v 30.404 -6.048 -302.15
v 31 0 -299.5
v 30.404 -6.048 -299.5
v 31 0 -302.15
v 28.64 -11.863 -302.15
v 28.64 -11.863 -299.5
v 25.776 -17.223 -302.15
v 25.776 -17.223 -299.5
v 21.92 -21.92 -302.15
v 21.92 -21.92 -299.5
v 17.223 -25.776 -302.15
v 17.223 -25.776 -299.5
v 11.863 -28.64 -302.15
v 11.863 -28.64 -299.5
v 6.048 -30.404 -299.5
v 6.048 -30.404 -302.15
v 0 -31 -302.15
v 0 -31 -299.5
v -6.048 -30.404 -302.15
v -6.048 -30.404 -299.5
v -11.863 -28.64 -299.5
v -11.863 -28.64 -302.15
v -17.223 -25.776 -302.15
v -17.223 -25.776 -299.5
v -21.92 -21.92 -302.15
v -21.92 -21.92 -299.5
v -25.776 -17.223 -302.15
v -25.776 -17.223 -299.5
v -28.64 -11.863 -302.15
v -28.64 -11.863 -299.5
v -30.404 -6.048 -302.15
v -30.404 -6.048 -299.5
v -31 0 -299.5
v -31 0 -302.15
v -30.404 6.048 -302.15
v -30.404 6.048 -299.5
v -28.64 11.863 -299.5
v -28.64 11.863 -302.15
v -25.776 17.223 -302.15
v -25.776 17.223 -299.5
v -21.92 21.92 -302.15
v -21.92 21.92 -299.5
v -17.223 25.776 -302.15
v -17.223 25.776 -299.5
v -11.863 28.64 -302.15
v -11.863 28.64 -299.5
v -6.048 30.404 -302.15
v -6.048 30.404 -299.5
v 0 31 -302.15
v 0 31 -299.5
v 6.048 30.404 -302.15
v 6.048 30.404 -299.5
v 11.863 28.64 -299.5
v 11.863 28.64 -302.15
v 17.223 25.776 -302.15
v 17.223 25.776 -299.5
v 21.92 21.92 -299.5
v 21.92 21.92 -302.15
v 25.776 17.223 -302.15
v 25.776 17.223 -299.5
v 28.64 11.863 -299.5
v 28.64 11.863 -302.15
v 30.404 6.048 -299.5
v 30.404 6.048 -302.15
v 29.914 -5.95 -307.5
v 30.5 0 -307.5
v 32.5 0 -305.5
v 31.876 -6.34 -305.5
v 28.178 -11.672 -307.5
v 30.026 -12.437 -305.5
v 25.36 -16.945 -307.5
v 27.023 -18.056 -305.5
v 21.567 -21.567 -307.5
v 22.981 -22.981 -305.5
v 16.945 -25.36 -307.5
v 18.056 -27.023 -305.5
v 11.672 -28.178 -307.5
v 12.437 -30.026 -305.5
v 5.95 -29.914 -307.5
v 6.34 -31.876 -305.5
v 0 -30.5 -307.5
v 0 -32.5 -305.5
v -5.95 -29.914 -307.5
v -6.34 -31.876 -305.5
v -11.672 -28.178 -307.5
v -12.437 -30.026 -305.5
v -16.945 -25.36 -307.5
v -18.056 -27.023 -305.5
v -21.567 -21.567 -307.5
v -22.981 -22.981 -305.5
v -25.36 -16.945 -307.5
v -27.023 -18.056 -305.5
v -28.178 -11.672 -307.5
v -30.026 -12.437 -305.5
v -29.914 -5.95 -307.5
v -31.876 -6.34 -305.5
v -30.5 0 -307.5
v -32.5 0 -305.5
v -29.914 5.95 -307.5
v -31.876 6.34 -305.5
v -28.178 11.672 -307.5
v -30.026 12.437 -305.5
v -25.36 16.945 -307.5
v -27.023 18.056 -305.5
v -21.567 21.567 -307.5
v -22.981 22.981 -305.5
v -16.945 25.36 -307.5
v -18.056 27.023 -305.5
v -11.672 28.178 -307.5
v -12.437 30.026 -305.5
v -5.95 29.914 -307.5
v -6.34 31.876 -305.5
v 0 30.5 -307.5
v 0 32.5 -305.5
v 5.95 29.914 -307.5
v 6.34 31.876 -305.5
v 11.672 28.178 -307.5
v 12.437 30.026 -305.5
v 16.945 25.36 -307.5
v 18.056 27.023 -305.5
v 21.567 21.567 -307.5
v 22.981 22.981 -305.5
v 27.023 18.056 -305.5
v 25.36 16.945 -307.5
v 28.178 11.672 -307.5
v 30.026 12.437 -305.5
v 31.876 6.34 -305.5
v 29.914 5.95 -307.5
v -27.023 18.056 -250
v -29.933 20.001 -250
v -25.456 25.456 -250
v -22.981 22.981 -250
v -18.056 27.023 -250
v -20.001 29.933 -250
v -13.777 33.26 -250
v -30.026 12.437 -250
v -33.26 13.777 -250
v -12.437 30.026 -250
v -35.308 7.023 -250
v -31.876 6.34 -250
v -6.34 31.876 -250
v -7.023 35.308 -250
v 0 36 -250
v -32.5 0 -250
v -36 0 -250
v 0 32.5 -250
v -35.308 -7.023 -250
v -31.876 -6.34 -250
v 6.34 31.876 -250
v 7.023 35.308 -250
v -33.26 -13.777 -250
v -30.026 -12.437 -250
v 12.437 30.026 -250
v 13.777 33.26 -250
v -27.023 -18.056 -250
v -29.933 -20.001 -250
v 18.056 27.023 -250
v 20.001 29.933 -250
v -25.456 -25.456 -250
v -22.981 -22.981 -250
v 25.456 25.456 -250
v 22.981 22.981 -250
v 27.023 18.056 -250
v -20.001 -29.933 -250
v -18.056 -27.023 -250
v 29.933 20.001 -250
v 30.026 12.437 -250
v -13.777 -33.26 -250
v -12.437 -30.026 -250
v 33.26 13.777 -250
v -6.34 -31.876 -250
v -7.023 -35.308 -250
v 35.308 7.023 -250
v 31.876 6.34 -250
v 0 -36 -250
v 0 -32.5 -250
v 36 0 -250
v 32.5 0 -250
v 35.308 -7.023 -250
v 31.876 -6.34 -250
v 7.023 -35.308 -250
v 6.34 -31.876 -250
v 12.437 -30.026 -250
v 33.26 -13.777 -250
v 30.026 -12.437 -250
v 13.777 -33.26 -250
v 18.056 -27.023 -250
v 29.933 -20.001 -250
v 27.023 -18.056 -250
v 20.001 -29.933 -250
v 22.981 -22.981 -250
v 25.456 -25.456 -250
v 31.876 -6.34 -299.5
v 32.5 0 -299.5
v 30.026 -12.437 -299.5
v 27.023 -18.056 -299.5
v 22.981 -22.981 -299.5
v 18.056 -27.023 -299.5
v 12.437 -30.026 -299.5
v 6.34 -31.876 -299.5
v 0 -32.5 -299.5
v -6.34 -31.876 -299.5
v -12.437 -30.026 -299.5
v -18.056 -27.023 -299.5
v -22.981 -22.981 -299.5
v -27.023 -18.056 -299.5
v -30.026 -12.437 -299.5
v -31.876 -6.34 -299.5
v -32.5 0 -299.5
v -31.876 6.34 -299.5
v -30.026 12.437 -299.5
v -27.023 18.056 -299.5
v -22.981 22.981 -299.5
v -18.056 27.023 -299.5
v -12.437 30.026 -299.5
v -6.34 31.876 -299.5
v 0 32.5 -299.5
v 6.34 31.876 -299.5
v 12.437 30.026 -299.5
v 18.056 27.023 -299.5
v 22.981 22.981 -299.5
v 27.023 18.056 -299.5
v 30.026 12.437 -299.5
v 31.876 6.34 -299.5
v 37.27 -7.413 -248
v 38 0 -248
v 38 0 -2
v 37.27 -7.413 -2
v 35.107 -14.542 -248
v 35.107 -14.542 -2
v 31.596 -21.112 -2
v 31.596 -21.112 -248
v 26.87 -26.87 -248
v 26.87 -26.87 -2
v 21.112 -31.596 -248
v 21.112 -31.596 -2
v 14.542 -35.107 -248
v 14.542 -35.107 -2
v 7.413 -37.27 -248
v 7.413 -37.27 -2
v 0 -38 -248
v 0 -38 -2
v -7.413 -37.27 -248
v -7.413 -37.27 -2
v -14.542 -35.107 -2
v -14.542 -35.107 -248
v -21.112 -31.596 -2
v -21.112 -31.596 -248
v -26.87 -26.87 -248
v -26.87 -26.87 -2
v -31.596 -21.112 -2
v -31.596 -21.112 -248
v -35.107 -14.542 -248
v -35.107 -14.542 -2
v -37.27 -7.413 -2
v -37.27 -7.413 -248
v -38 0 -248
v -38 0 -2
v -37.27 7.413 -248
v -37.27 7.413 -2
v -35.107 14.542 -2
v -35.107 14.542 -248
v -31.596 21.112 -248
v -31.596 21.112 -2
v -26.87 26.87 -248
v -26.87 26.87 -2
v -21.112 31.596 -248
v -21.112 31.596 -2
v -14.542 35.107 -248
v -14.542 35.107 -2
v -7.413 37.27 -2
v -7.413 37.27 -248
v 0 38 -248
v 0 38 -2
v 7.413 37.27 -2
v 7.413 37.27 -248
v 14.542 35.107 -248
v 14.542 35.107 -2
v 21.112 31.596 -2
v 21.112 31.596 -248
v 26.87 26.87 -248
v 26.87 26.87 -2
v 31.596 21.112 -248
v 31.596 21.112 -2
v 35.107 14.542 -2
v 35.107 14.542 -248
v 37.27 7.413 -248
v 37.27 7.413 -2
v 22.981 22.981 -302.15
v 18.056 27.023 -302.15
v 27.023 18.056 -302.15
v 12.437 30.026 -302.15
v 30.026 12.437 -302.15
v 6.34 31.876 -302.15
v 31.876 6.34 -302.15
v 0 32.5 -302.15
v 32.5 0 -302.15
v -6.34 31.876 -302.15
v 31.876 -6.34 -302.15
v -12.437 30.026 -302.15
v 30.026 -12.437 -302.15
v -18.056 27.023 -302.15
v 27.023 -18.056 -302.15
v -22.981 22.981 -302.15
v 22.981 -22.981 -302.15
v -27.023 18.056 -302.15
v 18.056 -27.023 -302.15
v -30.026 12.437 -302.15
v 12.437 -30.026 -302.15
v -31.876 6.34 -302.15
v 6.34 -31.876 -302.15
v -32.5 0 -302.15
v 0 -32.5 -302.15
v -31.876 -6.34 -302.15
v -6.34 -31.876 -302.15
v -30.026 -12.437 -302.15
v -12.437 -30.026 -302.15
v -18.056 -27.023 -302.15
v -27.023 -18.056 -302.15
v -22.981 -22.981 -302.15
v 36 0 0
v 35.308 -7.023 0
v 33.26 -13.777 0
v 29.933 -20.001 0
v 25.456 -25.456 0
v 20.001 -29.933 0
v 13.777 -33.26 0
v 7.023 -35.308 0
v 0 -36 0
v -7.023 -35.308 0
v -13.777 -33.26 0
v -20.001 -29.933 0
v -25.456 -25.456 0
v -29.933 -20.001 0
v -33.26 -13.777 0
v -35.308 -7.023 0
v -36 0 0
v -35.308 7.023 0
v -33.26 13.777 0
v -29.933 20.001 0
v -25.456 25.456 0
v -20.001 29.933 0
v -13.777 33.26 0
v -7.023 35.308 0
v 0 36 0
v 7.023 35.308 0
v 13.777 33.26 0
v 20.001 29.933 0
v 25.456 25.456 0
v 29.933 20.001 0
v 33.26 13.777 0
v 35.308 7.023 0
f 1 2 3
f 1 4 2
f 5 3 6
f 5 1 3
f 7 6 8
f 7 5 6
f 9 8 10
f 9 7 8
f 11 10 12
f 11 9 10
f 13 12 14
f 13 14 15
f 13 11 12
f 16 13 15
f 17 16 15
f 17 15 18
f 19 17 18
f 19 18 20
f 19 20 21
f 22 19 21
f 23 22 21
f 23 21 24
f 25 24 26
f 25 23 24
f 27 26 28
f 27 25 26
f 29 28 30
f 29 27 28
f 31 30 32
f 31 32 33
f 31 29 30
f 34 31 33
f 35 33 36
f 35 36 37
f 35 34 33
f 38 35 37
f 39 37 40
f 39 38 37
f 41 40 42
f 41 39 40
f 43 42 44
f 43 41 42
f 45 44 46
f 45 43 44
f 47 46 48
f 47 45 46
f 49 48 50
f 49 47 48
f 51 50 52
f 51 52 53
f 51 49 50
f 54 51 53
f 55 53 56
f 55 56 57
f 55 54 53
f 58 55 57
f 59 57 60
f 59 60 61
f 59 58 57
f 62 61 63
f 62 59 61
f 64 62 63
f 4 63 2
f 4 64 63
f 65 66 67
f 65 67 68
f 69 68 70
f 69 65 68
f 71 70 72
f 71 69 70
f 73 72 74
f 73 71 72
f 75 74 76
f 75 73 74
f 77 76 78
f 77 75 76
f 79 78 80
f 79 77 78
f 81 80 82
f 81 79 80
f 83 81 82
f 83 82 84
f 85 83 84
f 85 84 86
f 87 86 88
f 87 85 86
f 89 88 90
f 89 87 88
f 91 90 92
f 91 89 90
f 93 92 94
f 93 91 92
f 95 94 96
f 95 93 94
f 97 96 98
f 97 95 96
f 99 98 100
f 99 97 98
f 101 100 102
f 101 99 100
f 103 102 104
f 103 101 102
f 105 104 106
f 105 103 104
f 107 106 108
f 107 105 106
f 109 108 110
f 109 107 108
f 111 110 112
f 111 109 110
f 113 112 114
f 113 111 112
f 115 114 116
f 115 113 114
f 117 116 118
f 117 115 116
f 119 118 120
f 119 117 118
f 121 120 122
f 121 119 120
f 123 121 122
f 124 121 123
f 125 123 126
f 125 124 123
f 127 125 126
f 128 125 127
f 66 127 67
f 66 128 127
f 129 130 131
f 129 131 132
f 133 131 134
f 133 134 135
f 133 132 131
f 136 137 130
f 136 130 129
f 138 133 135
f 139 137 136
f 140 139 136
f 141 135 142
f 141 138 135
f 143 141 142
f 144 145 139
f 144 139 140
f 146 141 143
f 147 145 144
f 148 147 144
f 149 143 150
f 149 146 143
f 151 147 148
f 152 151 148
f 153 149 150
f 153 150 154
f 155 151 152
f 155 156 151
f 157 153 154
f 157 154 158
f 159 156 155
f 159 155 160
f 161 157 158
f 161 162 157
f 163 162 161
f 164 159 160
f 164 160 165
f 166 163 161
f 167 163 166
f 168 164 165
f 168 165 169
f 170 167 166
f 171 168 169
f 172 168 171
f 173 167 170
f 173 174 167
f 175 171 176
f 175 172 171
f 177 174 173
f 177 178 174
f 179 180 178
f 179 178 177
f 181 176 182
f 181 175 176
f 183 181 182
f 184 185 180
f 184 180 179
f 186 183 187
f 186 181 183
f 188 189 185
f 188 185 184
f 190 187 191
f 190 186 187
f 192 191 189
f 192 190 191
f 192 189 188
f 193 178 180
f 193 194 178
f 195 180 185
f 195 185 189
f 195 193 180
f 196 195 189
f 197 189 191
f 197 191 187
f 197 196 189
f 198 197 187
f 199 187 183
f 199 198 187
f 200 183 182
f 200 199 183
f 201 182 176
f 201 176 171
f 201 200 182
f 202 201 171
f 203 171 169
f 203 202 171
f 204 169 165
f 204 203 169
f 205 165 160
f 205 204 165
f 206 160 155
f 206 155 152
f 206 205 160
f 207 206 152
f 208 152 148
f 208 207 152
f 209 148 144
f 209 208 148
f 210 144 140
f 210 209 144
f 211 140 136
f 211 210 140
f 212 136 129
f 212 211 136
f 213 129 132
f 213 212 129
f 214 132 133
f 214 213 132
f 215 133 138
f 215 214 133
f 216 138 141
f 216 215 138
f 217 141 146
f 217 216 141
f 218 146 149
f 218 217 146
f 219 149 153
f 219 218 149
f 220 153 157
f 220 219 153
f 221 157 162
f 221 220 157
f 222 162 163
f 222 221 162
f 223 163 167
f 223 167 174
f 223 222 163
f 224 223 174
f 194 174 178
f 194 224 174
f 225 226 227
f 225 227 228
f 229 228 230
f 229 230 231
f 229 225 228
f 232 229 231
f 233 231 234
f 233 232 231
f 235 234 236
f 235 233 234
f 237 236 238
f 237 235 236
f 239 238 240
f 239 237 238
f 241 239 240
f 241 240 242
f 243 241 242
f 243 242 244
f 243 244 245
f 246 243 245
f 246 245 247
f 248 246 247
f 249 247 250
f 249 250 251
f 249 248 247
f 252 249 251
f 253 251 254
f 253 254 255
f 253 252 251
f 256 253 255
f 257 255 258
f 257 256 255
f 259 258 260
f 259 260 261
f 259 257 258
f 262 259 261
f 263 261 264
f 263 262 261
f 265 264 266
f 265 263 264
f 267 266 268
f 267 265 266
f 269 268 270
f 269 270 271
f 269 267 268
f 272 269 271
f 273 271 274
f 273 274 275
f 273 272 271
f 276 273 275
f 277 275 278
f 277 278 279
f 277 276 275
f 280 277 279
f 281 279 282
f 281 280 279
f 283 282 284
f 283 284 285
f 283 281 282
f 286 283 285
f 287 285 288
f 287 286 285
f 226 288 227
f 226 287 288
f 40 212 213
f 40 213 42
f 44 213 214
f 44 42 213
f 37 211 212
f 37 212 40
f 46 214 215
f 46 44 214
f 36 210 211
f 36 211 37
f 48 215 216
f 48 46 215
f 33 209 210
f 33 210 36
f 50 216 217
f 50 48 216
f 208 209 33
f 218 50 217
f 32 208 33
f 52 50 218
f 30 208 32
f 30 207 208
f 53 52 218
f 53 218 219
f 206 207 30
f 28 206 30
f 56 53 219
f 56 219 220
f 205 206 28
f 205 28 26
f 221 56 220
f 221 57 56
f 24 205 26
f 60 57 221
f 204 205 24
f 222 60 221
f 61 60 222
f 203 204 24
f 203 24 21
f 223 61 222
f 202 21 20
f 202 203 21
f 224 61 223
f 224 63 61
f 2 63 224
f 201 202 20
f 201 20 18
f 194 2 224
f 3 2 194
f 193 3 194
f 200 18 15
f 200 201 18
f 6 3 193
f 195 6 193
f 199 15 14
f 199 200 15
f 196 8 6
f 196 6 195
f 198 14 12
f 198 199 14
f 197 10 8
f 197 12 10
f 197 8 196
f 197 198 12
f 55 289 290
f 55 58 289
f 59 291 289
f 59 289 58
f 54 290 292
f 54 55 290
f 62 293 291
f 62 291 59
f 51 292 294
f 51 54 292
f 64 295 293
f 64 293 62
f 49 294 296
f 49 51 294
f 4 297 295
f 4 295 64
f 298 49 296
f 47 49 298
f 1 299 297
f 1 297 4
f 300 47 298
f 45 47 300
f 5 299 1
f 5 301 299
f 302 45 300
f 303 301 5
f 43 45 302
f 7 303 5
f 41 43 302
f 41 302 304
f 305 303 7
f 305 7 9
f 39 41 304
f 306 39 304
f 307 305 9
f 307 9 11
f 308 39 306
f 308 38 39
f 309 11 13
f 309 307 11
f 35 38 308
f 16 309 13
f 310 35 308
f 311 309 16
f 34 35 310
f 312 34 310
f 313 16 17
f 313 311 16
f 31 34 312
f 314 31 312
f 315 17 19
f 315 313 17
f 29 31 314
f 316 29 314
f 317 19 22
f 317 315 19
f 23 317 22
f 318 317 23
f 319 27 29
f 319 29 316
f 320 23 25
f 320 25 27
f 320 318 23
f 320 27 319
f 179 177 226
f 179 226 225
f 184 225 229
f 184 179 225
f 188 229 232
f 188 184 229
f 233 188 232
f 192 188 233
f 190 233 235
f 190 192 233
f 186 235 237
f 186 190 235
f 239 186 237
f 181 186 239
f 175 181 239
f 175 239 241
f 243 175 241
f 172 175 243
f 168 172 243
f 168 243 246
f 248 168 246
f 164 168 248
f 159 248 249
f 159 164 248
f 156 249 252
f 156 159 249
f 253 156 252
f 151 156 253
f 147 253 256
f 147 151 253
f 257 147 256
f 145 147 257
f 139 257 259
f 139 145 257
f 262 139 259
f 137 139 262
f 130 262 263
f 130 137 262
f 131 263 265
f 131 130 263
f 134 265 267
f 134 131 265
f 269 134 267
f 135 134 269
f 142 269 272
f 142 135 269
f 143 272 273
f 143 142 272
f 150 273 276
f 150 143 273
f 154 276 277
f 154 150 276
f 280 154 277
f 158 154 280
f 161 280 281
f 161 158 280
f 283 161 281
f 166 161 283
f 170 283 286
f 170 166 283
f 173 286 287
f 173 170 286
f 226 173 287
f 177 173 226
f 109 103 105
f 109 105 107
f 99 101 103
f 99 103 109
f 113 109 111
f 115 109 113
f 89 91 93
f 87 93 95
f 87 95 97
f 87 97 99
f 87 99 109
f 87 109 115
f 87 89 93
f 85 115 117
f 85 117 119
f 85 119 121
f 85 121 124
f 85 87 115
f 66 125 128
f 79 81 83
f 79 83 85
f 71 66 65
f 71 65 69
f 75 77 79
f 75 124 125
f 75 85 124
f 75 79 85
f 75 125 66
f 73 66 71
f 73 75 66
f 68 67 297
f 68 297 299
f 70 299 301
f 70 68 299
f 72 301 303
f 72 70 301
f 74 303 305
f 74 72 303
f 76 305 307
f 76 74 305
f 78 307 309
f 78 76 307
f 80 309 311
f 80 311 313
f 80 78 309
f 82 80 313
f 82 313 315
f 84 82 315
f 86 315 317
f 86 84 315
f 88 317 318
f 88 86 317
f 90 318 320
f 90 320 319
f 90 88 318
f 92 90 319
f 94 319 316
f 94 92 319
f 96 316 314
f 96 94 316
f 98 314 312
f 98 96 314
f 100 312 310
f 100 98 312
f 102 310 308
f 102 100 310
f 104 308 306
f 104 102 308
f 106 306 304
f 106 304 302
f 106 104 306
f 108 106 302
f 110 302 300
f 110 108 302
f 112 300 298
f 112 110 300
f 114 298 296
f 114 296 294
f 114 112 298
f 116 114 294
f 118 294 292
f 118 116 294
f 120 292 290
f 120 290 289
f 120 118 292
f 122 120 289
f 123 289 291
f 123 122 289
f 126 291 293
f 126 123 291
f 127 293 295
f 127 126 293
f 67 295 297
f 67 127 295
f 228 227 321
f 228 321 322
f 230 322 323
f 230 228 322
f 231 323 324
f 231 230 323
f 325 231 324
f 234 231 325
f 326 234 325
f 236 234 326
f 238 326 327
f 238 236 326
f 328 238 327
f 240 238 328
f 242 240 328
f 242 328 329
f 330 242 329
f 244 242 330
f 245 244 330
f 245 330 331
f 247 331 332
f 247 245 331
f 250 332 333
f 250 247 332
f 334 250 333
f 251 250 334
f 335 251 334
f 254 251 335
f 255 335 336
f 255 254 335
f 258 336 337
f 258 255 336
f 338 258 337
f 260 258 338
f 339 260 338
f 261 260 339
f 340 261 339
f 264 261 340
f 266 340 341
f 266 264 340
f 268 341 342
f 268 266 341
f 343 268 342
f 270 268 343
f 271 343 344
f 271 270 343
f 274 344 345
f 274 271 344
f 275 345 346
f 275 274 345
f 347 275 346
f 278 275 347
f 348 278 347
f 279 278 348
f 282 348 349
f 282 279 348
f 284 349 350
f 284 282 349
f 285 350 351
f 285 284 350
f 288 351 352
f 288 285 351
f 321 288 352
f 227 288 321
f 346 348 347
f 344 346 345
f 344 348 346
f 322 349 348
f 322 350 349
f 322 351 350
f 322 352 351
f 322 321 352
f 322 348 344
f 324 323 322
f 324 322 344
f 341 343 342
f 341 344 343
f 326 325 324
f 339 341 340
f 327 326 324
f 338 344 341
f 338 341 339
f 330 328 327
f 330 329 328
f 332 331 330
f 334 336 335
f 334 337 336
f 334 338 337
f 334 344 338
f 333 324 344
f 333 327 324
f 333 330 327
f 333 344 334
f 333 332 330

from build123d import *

# Parameters (mm, degrees)
CHAMFER_1_SIZE = 2


with BuildPart() as part:
    # Эскиз1 → Повернуть1 (revolve)
    with BuildSketch(Plane(origin=(0, 0, 0), x_dir=(0, 0, -1), z_dir=(1, 0, 0)), mode=Mode.PRIVATE) as revolve_1_sk:
        Polygon((0, 0), (0, 38), (250, 38), (250, 32.5), (299.5, 32.5), (299.5, 31), (302.15, 31), (302.15, 32.5), (307.5, 32.5), (307.5, 0), align=None)
    revolve(revolve_1_sk.sketch.rotate(Axis((0, 0, 0), (0, 0, -1)), 90), axis=Axis((0, 0, 0), (0, 0, -1)))

    # Фаска1
    chamfer_1_edges = [part.edges().sort_by_distance(p)[0] for p in [
        (-38, 0, -250),
        (-38, 0, 0),
        (-32.5, 0, -307.5),
    ]]
    chamfer(chamfer_1_edges, length=CHAMFER_1_SIZE)


solid = part.part
